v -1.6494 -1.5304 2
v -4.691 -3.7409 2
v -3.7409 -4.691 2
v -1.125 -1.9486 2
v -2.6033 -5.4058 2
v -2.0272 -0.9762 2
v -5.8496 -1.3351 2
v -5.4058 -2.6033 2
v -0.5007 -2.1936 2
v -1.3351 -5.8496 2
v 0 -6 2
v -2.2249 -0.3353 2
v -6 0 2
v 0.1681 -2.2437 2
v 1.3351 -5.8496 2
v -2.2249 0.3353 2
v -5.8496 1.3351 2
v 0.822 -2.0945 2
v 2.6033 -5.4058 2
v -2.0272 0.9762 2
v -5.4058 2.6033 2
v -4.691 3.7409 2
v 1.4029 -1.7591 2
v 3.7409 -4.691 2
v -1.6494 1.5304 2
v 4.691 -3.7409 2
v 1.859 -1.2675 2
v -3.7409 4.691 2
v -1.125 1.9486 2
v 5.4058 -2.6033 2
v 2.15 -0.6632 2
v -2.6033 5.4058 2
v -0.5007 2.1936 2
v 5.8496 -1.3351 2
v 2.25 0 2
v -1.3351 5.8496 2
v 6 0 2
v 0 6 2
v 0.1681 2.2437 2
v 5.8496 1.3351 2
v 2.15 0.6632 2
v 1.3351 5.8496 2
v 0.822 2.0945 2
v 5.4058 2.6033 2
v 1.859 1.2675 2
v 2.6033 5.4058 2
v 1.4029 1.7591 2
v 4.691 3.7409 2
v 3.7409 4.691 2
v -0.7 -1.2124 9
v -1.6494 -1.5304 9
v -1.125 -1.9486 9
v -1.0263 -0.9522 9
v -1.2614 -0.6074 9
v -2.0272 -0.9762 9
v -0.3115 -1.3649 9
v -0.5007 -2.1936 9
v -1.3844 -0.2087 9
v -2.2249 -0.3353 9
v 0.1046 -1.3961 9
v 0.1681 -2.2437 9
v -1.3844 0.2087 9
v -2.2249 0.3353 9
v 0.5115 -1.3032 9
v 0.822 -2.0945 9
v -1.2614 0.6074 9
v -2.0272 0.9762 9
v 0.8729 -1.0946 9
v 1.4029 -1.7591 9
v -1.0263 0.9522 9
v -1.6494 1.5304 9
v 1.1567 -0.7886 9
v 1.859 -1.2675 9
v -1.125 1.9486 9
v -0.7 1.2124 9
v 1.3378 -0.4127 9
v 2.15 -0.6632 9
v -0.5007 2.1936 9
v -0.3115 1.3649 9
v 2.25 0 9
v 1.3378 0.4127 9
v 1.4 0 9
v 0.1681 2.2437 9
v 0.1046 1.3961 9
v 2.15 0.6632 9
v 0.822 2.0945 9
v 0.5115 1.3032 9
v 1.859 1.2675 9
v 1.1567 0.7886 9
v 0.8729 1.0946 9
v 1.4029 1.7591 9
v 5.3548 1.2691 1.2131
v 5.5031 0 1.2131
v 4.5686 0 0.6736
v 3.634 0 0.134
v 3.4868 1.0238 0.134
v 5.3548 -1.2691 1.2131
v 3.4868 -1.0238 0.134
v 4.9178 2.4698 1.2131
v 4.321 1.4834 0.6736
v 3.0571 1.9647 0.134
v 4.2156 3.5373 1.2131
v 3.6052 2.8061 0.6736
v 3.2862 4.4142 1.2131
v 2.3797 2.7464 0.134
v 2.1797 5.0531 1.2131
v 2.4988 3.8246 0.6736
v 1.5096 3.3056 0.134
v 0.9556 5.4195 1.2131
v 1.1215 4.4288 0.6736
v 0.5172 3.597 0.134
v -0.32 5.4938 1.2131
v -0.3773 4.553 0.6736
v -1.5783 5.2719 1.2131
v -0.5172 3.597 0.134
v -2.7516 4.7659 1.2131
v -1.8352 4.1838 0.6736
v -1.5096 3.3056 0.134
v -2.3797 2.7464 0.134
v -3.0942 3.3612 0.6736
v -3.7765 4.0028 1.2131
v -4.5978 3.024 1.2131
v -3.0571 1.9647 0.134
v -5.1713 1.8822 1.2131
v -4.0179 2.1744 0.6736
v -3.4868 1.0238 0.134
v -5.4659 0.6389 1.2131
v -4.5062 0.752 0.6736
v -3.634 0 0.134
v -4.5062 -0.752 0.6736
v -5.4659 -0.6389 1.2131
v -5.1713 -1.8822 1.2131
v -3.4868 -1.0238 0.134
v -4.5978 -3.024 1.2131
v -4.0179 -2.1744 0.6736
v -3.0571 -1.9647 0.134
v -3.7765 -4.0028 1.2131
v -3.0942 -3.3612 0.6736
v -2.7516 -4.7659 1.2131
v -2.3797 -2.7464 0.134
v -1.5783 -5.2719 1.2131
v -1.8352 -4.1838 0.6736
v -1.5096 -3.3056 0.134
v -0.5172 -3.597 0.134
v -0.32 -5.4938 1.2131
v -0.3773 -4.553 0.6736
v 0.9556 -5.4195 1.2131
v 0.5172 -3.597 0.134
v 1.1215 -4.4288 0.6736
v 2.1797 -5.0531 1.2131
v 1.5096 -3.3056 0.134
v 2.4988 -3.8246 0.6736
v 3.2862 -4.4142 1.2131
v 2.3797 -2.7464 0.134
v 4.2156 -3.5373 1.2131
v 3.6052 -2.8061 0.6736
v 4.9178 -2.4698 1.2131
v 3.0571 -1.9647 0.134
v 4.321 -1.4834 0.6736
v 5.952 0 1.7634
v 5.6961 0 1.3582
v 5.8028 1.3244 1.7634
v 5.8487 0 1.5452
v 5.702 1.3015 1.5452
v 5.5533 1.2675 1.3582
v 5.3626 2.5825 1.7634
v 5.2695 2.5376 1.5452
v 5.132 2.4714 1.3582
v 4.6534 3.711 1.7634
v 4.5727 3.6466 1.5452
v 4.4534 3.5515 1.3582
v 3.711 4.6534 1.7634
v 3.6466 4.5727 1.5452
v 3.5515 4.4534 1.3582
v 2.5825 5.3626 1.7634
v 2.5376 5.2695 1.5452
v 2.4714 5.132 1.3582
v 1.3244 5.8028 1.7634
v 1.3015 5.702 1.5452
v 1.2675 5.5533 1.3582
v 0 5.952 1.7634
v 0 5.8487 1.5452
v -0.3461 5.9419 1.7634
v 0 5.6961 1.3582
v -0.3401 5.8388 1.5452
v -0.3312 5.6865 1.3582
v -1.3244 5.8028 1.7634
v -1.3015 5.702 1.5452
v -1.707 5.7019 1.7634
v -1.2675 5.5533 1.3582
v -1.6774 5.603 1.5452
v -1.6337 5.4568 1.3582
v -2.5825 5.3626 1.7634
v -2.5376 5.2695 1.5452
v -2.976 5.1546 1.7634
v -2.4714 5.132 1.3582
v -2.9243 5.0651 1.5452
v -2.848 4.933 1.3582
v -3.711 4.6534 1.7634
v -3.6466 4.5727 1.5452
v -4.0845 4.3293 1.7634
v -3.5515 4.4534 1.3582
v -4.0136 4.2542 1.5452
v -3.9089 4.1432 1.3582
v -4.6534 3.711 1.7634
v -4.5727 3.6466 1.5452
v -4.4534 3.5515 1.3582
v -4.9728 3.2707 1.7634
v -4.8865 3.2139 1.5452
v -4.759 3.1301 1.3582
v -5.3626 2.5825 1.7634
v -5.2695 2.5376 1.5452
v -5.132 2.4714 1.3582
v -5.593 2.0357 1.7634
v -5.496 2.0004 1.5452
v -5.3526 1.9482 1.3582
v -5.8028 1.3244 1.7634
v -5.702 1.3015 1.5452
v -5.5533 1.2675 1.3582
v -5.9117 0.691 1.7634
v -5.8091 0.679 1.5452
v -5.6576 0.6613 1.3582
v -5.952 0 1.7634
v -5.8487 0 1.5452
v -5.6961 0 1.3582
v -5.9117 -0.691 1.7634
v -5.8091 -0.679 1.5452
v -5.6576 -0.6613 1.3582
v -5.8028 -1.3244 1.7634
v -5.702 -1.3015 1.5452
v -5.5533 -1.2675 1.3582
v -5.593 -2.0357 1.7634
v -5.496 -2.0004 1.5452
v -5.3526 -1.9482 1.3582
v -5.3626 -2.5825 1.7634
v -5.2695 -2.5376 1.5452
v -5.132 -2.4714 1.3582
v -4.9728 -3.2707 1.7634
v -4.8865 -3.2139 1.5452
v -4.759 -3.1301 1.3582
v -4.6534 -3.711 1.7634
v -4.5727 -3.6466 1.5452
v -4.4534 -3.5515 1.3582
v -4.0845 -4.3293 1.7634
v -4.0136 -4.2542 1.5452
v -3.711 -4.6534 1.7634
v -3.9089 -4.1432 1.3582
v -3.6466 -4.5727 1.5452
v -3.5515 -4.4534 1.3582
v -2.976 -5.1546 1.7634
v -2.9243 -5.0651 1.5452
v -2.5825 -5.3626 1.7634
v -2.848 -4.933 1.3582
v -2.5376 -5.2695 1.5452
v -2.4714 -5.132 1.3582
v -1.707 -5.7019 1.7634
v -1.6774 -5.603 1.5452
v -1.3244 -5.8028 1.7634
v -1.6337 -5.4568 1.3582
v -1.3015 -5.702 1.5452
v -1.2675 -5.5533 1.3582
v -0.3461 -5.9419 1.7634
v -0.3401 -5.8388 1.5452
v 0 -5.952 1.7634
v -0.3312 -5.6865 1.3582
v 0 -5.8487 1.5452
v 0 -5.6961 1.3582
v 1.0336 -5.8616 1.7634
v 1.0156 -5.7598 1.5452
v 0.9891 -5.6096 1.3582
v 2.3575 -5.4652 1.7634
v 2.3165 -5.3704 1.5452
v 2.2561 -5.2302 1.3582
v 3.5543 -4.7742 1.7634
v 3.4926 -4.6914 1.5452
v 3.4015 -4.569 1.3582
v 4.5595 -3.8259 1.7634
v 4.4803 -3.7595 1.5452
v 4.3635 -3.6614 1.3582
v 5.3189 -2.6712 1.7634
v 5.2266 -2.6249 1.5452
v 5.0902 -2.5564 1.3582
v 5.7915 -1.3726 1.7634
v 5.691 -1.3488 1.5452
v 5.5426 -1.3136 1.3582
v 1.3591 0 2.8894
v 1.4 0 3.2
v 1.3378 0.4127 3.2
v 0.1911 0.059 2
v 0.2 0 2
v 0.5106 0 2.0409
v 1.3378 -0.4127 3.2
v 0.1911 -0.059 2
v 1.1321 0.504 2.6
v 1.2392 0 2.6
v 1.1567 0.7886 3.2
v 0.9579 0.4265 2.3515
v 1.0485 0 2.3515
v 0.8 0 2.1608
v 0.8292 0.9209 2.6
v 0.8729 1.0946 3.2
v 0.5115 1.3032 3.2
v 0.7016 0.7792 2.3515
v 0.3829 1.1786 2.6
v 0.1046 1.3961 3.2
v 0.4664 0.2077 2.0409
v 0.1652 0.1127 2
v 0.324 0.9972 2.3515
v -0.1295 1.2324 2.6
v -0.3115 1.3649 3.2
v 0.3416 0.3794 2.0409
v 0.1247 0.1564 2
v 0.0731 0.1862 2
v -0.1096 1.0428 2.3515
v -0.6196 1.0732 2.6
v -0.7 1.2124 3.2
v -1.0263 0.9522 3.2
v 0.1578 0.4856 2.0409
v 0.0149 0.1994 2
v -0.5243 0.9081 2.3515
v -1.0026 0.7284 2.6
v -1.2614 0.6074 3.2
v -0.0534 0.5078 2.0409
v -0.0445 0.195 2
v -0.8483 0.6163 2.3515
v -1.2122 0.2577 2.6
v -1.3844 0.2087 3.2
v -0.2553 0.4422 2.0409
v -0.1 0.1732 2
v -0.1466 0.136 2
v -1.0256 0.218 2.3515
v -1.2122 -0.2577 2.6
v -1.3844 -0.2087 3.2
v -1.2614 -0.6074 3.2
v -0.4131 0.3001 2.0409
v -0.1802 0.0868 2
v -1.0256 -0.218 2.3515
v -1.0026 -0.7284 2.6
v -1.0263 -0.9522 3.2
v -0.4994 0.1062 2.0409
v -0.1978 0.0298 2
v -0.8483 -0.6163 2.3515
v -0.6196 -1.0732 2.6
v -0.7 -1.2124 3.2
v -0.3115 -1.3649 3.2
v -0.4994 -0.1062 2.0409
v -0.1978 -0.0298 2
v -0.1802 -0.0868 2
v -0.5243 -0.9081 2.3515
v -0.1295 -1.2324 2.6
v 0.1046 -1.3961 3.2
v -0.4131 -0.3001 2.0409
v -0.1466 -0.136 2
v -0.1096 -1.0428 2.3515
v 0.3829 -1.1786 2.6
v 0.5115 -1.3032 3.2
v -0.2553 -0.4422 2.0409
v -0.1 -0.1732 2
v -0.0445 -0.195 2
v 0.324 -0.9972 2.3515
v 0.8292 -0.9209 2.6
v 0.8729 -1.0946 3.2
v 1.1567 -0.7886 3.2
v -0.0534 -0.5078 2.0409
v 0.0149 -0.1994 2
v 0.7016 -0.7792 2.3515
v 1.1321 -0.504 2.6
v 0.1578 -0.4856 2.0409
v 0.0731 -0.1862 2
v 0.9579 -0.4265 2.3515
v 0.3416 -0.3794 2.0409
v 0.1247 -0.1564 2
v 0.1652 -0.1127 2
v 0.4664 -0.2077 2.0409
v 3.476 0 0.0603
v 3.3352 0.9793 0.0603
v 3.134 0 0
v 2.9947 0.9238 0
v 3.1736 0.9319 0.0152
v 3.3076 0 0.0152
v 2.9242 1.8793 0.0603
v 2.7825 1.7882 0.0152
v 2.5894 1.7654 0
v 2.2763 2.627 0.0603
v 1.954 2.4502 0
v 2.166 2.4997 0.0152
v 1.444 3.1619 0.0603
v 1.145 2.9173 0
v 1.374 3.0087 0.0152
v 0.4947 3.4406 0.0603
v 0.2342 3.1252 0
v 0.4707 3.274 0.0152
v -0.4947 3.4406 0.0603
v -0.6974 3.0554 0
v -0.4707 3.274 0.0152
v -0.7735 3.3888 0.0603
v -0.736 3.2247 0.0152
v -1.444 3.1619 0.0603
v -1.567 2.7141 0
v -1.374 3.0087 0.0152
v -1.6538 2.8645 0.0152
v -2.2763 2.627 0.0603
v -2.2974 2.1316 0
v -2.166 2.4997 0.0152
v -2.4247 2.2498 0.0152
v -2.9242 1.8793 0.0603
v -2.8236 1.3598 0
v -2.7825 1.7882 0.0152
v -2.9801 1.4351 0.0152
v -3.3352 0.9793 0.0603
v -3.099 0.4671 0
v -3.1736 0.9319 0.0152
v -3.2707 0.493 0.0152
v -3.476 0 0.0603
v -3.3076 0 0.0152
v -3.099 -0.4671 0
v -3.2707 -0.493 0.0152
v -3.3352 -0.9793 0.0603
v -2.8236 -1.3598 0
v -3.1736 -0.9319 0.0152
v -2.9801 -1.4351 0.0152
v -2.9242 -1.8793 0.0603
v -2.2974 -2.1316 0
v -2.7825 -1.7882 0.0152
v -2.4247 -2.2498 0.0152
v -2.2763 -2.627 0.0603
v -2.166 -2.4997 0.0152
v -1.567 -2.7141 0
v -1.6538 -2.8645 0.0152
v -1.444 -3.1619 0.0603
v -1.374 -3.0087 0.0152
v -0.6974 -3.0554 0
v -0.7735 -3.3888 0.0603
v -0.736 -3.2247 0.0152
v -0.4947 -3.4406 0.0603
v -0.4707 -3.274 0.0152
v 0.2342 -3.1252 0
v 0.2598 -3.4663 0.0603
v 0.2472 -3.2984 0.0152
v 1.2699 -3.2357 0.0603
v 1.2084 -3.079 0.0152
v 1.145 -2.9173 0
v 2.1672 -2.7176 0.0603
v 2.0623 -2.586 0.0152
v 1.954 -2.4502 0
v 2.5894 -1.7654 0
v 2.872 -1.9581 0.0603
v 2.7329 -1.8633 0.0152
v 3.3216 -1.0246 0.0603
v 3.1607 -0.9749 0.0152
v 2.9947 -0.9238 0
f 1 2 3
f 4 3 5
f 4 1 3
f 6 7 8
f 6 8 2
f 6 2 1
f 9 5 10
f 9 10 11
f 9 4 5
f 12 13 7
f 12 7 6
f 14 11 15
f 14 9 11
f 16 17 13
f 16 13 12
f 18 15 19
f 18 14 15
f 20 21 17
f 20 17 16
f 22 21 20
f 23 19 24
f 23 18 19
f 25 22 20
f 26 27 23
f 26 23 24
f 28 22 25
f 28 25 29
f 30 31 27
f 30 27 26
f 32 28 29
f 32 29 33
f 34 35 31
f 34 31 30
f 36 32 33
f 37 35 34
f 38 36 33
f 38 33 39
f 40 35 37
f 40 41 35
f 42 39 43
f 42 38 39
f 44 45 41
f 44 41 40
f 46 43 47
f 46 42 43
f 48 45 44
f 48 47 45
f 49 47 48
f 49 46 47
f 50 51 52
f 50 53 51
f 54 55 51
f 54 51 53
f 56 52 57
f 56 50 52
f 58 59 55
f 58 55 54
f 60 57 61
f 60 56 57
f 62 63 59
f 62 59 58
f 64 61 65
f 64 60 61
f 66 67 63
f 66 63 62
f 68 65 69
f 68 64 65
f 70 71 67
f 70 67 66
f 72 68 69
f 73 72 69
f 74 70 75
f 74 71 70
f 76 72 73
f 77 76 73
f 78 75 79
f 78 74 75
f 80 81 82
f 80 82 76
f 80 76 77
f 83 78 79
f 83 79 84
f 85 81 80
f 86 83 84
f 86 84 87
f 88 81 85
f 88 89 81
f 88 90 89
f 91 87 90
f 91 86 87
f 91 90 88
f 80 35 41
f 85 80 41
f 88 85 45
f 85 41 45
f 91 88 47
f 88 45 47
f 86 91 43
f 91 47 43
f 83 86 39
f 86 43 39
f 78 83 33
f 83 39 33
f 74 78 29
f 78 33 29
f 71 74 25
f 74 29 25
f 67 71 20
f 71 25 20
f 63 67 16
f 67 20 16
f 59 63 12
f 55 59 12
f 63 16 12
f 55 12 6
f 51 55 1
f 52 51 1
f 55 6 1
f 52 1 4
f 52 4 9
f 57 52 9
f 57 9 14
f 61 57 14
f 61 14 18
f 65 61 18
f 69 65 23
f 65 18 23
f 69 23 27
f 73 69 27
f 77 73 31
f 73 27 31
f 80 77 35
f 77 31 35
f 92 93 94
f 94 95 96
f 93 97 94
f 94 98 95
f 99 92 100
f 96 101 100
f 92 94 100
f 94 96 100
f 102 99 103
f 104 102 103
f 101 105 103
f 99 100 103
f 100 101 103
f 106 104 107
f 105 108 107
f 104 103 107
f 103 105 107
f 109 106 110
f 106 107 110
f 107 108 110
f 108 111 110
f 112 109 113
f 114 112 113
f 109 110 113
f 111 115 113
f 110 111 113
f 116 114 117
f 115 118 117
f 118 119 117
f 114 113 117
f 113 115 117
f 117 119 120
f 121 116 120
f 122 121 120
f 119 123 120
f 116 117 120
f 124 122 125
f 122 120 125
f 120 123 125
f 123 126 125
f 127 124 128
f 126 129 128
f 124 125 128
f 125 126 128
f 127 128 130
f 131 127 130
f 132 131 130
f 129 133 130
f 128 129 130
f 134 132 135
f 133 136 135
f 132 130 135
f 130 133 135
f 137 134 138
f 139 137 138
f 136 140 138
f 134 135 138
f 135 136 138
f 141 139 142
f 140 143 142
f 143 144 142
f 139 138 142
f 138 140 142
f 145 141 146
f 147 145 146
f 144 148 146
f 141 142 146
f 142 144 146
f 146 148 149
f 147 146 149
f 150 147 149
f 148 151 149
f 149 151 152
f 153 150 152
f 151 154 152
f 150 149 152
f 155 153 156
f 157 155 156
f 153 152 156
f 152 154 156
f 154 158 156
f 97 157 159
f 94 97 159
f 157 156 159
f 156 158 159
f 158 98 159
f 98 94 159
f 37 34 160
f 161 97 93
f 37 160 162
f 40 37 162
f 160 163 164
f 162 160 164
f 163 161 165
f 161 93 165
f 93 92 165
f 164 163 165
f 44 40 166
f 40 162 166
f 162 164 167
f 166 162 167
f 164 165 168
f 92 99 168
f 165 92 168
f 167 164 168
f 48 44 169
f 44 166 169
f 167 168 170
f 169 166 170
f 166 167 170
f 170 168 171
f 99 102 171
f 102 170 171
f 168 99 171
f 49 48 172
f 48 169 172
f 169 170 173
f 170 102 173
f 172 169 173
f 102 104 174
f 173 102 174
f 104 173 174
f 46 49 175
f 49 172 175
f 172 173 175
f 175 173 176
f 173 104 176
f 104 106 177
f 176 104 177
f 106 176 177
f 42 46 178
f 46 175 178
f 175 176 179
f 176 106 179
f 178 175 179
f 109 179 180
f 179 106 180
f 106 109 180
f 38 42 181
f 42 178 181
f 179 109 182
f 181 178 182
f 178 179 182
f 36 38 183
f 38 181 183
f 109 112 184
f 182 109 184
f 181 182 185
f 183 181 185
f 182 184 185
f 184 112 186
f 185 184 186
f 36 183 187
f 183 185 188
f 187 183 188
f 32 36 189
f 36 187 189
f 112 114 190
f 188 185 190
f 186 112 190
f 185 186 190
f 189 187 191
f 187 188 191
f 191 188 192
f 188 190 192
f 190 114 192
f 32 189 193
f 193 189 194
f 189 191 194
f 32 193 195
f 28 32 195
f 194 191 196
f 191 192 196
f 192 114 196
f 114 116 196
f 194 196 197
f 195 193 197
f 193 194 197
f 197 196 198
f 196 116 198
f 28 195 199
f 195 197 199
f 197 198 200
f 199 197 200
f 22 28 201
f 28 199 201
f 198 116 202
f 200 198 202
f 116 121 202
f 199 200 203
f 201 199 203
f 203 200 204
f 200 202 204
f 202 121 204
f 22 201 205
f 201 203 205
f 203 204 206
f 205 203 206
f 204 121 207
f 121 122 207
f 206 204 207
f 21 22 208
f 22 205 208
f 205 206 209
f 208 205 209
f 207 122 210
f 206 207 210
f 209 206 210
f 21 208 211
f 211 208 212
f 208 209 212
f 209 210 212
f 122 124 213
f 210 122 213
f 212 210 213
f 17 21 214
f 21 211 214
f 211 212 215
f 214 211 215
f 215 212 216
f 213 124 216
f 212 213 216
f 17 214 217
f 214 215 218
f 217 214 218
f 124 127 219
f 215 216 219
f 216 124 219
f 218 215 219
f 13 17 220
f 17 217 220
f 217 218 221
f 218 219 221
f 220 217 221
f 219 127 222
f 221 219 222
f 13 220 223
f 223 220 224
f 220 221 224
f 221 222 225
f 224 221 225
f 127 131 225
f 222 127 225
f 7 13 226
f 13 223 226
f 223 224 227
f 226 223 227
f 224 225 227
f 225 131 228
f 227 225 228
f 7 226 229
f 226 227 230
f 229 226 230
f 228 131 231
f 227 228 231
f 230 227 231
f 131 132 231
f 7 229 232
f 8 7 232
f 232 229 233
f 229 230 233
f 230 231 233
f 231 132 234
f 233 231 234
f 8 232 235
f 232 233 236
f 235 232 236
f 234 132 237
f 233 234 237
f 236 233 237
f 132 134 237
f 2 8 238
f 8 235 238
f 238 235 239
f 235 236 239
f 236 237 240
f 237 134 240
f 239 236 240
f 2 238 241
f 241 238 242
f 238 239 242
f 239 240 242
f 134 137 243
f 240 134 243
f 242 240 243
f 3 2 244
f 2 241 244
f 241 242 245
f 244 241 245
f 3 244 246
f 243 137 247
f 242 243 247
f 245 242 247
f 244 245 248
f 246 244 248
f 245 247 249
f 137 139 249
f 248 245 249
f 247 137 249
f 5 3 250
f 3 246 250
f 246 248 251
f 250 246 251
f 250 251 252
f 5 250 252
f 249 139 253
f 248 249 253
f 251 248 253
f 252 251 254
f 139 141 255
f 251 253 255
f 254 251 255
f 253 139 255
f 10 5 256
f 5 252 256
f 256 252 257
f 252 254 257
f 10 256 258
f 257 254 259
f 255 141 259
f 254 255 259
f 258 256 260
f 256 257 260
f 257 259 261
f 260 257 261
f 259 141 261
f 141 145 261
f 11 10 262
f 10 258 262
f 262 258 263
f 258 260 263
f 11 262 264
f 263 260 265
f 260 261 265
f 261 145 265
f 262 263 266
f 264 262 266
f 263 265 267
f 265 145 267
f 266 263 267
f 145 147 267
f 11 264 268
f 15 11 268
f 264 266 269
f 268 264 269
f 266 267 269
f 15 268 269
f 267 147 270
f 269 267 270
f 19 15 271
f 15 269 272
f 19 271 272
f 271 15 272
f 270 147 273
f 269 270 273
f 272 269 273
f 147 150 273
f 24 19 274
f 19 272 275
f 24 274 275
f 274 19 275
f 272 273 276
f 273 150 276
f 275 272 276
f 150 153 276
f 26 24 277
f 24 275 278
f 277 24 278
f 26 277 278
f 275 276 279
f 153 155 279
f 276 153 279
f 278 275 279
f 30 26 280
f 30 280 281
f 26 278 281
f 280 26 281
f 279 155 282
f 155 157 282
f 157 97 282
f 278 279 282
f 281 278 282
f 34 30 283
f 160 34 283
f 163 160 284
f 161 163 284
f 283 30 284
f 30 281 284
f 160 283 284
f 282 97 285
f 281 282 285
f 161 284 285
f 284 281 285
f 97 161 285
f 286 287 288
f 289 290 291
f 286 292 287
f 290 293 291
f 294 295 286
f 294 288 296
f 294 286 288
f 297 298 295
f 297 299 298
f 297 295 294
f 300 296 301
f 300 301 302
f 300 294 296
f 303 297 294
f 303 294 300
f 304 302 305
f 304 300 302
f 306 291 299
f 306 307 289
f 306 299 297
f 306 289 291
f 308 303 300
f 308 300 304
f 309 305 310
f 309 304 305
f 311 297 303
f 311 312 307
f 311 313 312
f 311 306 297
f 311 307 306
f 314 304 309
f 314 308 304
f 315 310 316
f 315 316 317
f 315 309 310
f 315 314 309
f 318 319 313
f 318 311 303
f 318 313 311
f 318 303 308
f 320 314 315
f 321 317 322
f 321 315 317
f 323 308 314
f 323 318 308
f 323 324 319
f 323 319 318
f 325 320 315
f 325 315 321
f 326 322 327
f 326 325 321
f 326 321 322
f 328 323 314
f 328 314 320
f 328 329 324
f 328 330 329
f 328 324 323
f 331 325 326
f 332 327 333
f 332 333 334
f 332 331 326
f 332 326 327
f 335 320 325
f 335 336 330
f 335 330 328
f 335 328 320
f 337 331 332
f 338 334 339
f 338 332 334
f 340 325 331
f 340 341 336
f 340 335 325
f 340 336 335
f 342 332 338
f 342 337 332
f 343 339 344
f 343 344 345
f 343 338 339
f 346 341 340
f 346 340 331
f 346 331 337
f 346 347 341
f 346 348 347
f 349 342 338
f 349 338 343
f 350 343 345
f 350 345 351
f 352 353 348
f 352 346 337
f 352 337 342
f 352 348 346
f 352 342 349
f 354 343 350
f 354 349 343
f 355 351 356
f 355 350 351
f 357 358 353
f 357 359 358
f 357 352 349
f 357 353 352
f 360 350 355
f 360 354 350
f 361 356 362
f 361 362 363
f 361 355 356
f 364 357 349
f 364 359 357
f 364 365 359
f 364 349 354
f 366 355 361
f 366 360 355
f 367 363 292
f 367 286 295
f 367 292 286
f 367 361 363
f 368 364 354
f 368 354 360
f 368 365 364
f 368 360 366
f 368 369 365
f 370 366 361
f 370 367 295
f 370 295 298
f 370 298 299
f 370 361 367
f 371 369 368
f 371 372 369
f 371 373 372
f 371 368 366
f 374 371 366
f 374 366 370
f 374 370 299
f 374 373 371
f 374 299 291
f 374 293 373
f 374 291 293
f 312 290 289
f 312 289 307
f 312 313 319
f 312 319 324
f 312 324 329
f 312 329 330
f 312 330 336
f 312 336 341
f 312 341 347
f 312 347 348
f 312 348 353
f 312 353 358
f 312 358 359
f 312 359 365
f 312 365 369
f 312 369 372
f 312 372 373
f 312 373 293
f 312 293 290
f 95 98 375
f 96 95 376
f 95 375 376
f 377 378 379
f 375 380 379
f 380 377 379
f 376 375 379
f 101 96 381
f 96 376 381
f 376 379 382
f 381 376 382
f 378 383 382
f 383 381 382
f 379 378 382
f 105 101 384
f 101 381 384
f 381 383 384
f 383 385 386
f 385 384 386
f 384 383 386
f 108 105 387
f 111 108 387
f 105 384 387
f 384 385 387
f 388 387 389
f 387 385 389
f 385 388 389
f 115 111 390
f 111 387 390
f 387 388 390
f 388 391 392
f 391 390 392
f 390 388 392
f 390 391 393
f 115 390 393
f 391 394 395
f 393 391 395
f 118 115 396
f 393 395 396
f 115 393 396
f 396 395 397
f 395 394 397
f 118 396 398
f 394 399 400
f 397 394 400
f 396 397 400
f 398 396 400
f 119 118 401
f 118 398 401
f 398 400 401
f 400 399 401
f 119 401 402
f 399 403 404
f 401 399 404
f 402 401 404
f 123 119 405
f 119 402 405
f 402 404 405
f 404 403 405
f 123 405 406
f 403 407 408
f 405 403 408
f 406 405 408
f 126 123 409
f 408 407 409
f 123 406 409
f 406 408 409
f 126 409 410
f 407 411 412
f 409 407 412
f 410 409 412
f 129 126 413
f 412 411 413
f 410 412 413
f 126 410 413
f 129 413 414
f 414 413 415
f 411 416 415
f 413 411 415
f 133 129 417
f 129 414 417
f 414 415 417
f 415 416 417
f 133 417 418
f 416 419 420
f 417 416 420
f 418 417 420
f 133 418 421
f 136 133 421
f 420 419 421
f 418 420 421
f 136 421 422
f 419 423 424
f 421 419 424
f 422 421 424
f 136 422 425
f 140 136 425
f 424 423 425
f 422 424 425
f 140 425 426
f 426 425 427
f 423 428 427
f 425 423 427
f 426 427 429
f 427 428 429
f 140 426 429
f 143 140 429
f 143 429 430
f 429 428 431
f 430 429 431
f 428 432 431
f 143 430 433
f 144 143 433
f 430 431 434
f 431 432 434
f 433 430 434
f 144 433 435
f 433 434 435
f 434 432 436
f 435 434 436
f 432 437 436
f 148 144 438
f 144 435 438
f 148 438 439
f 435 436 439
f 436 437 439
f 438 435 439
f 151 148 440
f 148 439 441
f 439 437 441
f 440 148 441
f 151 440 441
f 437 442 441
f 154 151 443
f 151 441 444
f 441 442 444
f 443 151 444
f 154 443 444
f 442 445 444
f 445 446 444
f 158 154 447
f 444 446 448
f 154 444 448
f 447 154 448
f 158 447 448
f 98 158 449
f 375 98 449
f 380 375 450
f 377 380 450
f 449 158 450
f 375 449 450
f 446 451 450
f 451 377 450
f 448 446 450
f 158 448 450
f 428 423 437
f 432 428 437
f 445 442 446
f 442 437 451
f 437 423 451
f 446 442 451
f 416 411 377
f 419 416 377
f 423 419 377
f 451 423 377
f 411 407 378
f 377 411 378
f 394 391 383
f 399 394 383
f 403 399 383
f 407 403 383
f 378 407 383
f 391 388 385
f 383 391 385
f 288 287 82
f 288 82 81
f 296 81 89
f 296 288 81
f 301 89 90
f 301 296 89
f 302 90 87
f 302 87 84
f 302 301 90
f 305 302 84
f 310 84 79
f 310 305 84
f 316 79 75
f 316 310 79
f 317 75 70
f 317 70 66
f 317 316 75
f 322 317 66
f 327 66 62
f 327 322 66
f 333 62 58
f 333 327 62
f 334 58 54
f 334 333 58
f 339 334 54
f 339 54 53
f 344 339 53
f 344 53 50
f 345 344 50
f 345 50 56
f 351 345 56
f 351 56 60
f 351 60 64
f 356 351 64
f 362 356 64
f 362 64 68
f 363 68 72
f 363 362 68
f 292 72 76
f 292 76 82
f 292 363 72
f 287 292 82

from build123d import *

# Parameters (mm, degrees)
F0_R     = 6
F1_DEPTH = 2
F2_SIZE2 = 2.5980762114
F2_SIZE  = 1.5
F4_R     = 2.25
F4_R_2   = 1.4
F5_DEPTH = 7
F6_R     = 1.2


# Not quite as in the source:
# - a fillet or chamfer that OpenCascade refuses, or shapes differently, is made with other operations: its cross-section is extruded or revolved along the edge and cut away or added


with BuildPart() as f1:
    # F0 (on Top) → F1 (new body)
    with BuildSketch(Plane.XY):
        Circle(F0_R)
    extrude(amount=F1_DEPTH)

    # F2
    f2_edges = [f1.edges().sort_by_distance(p)[0] for p in [
        (-6, 0, 0),
    ]]
    f2_side = f1.faces().sort_by_distance((-6, 0, 1))[0]
    chamfer(f2_edges, length=F2_SIZE, length2=F2_SIZE2, reference=f2_side)

    # F3: fillet of radius 1 on 2 edges, made by hand

    # F3_s1 → F3_t2 (revolve, cut)
    with BuildSketch(Plane.XZ):
        with BuildLine():
            ThreePointArc((3.6339745962, 0.1339745962), (3.3927936413, 0.0340741737), (3.1339745962, 0))
            Line((3.1339745962, 0), (3.4019237886, 0))
            Line((3.4019237886, 0), (3.6339745962, 0.1339745962))
        make_face()
    revolve(axis=Axis((0, 0, 0), (0, 0, 1)), mode=Mode.SUBTRACT)

    # F3_s3 → F3_t4 (revolve, cut)
    with BuildSketch(Plane.XZ):
        with BuildLine():
            ThreePointArc((6, 2), (5.8486778537, 1.5452494356), (5.5031382462, 1.2131367327))
            Line((5.5031382462, 1.2131367327), (6, 1.5))
            Line((6, 1.5), (6, 2))
        make_face()
    revolve(axis=Axis((0, 0, 1.5), (0, 0, 1)), mode=Mode.SUBTRACT)

    # F4 (on face) → F5 (join)
    with BuildSketch(Plane.XY.offset(2)):
        Circle(F4_R)
        Circle(F4_R_2, mode=Mode.SUBTRACT)
    extrude(amount=F5_DEPTH)

    # F6
    f6_edges = [f1.edges().sort_by_distance(p)[0] for p in [
        (-1.4, 0, 2),
    ]]
    fillet(f6_edges, radius=F6_R)


solid = f1.part
